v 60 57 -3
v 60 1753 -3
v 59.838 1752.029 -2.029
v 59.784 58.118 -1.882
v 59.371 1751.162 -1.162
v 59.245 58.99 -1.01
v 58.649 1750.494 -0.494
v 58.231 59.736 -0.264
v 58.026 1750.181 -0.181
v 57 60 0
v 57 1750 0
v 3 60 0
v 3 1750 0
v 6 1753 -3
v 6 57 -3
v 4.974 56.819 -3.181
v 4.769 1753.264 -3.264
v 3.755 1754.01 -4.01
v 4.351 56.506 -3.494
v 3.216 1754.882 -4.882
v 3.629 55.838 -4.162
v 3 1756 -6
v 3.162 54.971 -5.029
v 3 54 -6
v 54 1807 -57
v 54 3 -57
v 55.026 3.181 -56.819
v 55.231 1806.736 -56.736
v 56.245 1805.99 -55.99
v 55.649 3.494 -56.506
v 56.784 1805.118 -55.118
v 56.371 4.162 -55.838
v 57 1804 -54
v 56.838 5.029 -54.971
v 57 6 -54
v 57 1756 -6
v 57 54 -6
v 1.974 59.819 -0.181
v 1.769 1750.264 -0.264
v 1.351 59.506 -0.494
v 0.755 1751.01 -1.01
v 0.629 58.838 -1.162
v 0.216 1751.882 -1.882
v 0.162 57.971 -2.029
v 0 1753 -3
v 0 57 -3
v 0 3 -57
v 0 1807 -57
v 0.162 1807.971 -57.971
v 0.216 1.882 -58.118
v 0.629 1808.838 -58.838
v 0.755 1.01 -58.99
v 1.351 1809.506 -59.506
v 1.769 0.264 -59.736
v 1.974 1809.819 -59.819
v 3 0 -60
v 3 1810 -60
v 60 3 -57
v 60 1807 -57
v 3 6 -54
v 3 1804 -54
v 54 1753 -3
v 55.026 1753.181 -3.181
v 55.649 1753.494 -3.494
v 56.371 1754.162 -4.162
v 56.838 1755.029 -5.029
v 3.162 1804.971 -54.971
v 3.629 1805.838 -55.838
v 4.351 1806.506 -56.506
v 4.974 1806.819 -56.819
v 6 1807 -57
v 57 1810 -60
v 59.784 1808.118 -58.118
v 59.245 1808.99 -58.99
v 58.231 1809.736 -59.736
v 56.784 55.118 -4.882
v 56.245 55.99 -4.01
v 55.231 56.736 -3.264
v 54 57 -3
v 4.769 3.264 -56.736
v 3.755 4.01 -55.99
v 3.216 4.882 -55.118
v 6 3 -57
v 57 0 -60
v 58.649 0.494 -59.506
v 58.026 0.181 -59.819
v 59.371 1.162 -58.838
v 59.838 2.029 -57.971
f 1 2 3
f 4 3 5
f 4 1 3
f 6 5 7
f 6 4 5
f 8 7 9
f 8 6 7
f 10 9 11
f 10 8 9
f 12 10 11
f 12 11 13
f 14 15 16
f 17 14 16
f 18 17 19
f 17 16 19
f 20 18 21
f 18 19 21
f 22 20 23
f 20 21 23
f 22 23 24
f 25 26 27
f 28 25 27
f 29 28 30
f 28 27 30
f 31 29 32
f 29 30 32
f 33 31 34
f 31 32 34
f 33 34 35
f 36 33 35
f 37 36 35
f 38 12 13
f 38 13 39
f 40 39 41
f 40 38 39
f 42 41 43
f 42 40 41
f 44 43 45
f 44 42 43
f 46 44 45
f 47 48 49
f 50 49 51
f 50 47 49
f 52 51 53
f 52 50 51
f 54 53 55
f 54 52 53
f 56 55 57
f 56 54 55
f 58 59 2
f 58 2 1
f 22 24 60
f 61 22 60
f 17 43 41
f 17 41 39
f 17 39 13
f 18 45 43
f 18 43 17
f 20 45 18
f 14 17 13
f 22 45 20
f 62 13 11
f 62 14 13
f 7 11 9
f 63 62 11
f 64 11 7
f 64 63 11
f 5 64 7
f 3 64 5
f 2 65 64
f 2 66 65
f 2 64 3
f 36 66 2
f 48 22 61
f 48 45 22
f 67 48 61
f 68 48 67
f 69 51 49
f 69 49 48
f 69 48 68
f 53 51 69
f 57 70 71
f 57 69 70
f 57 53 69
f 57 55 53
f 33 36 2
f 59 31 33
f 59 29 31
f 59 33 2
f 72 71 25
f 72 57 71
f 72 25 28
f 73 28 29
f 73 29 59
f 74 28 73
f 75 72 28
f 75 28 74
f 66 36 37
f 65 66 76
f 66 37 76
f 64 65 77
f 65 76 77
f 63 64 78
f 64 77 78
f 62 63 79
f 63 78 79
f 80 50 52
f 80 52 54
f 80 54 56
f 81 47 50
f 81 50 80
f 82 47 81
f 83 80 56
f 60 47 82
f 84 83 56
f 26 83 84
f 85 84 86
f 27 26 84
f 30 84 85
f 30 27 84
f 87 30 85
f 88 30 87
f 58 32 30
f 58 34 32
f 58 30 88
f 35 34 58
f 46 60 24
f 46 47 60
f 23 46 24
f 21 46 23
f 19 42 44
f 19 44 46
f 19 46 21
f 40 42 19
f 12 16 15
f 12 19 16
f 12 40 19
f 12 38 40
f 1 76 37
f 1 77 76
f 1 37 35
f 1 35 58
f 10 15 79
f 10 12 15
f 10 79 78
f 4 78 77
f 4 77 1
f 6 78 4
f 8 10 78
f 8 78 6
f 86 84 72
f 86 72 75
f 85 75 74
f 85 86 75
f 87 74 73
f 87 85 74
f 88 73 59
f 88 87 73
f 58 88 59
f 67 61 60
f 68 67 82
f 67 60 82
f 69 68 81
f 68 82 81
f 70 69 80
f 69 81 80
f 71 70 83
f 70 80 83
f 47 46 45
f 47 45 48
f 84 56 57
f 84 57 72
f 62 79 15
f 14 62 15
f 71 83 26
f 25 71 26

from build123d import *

# Parameters (mm, degrees)
DODANIE_WYCI_GNI_CIE1_DEPTH = 1810
SZKIC2_W                    = 172.684782789
SZKIC2_H                    = 104.540186521
WYTNIJ_WYCI_GNI_CIE1_DEPTH  = 1324.650255921
SZKIC3_W                    = 177.628833627
SZKIC3_H                    = 120.563010223
WYTNIJ_WYCI_GNI_CIE2_DEPTH  = 1782.263596439


with BuildPart() as part:
    # Szkic1 → Dodanie-wyciągnięcie1 (new body)
    with BuildSketch(Plane(origin=(0, 0, 0), x_dir=(1, 0, 0), z_dir=(0, 1, 0))):
        with BuildLine():
            ThreePointArc((0, 57), (0.878679656, 59.121320344), (3, 60))
            Line((3, 60), (57, 60))
            ThreePointArc((57, 60), (59.121320344, 59.121320344), (60, 57))
            Line((60, 57), (60, 3))
            ThreePointArc((60, 3), (59.121320344, 0.878679656), (57, 0))
            Line((57, 0), (3, 0))
            ThreePointArc((3, 0), (0.878679656, 0.878679656), (0, 3))
            Line((0, 3), (0, 57))
        make_face()
        with BuildLine():
            Line((3, 6), (3, 54))
            ThreePointArc((3, 54), (3.878679656, 56.121320344), (6, 57))
            Line((6, 57), (54, 57))
            ThreePointArc((54, 57), (56.121320344, 56.121320344), (57, 54))
            Line((57, 54), (57, 6))
            ThreePointArc((57, 6), (56.121320344, 3.878679656), (54, 3))
            Line((54, 3), (6, 3))
            ThreePointArc((6, 3), (3.878679656, 3.878679656), (3, 6))
        make_face(mode=Mode.SUBTRACT)
    extrude(amount=DODANIE_WYCI_GNI_CIE1_DEPTH)

    # Szkic2 → Wytnij-wyciągnięcie1 (cut, through all)
    with BuildSketch(Plane(origin=(0, 875, 875), x_dir=(1, 0, 0), z_dir=(0, 0.7071067811865464, 0.7071067811865488))):
        with Locations((31.260805739, 1283.757898566)):
            Rectangle(SZKIC2_W, SZKIC2_H)
    extrude(amount=WYTNIJ_WYCI_GNI_CIE1_DEPTH, mode=Mode.SUBTRACT)

    # Szkic3 → Wytnij-wyciągnięcie2 (cut, through all)
    with BuildSketch(Plane(origin=(0, 30, -30), x_dir=(1, 0, 0), z_dir=(0, -0.7071067811865464, 0.7071067811865488))):
        with Locations((21.62509475, 2.040675712)):
            Rectangle(SZKIC3_W, SZKIC3_H)
    extrude(amount=WYTNIJ_WYCI_GNI_CIE2_DEPTH, mode=Mode.SUBTRACT)


solid = part.part
